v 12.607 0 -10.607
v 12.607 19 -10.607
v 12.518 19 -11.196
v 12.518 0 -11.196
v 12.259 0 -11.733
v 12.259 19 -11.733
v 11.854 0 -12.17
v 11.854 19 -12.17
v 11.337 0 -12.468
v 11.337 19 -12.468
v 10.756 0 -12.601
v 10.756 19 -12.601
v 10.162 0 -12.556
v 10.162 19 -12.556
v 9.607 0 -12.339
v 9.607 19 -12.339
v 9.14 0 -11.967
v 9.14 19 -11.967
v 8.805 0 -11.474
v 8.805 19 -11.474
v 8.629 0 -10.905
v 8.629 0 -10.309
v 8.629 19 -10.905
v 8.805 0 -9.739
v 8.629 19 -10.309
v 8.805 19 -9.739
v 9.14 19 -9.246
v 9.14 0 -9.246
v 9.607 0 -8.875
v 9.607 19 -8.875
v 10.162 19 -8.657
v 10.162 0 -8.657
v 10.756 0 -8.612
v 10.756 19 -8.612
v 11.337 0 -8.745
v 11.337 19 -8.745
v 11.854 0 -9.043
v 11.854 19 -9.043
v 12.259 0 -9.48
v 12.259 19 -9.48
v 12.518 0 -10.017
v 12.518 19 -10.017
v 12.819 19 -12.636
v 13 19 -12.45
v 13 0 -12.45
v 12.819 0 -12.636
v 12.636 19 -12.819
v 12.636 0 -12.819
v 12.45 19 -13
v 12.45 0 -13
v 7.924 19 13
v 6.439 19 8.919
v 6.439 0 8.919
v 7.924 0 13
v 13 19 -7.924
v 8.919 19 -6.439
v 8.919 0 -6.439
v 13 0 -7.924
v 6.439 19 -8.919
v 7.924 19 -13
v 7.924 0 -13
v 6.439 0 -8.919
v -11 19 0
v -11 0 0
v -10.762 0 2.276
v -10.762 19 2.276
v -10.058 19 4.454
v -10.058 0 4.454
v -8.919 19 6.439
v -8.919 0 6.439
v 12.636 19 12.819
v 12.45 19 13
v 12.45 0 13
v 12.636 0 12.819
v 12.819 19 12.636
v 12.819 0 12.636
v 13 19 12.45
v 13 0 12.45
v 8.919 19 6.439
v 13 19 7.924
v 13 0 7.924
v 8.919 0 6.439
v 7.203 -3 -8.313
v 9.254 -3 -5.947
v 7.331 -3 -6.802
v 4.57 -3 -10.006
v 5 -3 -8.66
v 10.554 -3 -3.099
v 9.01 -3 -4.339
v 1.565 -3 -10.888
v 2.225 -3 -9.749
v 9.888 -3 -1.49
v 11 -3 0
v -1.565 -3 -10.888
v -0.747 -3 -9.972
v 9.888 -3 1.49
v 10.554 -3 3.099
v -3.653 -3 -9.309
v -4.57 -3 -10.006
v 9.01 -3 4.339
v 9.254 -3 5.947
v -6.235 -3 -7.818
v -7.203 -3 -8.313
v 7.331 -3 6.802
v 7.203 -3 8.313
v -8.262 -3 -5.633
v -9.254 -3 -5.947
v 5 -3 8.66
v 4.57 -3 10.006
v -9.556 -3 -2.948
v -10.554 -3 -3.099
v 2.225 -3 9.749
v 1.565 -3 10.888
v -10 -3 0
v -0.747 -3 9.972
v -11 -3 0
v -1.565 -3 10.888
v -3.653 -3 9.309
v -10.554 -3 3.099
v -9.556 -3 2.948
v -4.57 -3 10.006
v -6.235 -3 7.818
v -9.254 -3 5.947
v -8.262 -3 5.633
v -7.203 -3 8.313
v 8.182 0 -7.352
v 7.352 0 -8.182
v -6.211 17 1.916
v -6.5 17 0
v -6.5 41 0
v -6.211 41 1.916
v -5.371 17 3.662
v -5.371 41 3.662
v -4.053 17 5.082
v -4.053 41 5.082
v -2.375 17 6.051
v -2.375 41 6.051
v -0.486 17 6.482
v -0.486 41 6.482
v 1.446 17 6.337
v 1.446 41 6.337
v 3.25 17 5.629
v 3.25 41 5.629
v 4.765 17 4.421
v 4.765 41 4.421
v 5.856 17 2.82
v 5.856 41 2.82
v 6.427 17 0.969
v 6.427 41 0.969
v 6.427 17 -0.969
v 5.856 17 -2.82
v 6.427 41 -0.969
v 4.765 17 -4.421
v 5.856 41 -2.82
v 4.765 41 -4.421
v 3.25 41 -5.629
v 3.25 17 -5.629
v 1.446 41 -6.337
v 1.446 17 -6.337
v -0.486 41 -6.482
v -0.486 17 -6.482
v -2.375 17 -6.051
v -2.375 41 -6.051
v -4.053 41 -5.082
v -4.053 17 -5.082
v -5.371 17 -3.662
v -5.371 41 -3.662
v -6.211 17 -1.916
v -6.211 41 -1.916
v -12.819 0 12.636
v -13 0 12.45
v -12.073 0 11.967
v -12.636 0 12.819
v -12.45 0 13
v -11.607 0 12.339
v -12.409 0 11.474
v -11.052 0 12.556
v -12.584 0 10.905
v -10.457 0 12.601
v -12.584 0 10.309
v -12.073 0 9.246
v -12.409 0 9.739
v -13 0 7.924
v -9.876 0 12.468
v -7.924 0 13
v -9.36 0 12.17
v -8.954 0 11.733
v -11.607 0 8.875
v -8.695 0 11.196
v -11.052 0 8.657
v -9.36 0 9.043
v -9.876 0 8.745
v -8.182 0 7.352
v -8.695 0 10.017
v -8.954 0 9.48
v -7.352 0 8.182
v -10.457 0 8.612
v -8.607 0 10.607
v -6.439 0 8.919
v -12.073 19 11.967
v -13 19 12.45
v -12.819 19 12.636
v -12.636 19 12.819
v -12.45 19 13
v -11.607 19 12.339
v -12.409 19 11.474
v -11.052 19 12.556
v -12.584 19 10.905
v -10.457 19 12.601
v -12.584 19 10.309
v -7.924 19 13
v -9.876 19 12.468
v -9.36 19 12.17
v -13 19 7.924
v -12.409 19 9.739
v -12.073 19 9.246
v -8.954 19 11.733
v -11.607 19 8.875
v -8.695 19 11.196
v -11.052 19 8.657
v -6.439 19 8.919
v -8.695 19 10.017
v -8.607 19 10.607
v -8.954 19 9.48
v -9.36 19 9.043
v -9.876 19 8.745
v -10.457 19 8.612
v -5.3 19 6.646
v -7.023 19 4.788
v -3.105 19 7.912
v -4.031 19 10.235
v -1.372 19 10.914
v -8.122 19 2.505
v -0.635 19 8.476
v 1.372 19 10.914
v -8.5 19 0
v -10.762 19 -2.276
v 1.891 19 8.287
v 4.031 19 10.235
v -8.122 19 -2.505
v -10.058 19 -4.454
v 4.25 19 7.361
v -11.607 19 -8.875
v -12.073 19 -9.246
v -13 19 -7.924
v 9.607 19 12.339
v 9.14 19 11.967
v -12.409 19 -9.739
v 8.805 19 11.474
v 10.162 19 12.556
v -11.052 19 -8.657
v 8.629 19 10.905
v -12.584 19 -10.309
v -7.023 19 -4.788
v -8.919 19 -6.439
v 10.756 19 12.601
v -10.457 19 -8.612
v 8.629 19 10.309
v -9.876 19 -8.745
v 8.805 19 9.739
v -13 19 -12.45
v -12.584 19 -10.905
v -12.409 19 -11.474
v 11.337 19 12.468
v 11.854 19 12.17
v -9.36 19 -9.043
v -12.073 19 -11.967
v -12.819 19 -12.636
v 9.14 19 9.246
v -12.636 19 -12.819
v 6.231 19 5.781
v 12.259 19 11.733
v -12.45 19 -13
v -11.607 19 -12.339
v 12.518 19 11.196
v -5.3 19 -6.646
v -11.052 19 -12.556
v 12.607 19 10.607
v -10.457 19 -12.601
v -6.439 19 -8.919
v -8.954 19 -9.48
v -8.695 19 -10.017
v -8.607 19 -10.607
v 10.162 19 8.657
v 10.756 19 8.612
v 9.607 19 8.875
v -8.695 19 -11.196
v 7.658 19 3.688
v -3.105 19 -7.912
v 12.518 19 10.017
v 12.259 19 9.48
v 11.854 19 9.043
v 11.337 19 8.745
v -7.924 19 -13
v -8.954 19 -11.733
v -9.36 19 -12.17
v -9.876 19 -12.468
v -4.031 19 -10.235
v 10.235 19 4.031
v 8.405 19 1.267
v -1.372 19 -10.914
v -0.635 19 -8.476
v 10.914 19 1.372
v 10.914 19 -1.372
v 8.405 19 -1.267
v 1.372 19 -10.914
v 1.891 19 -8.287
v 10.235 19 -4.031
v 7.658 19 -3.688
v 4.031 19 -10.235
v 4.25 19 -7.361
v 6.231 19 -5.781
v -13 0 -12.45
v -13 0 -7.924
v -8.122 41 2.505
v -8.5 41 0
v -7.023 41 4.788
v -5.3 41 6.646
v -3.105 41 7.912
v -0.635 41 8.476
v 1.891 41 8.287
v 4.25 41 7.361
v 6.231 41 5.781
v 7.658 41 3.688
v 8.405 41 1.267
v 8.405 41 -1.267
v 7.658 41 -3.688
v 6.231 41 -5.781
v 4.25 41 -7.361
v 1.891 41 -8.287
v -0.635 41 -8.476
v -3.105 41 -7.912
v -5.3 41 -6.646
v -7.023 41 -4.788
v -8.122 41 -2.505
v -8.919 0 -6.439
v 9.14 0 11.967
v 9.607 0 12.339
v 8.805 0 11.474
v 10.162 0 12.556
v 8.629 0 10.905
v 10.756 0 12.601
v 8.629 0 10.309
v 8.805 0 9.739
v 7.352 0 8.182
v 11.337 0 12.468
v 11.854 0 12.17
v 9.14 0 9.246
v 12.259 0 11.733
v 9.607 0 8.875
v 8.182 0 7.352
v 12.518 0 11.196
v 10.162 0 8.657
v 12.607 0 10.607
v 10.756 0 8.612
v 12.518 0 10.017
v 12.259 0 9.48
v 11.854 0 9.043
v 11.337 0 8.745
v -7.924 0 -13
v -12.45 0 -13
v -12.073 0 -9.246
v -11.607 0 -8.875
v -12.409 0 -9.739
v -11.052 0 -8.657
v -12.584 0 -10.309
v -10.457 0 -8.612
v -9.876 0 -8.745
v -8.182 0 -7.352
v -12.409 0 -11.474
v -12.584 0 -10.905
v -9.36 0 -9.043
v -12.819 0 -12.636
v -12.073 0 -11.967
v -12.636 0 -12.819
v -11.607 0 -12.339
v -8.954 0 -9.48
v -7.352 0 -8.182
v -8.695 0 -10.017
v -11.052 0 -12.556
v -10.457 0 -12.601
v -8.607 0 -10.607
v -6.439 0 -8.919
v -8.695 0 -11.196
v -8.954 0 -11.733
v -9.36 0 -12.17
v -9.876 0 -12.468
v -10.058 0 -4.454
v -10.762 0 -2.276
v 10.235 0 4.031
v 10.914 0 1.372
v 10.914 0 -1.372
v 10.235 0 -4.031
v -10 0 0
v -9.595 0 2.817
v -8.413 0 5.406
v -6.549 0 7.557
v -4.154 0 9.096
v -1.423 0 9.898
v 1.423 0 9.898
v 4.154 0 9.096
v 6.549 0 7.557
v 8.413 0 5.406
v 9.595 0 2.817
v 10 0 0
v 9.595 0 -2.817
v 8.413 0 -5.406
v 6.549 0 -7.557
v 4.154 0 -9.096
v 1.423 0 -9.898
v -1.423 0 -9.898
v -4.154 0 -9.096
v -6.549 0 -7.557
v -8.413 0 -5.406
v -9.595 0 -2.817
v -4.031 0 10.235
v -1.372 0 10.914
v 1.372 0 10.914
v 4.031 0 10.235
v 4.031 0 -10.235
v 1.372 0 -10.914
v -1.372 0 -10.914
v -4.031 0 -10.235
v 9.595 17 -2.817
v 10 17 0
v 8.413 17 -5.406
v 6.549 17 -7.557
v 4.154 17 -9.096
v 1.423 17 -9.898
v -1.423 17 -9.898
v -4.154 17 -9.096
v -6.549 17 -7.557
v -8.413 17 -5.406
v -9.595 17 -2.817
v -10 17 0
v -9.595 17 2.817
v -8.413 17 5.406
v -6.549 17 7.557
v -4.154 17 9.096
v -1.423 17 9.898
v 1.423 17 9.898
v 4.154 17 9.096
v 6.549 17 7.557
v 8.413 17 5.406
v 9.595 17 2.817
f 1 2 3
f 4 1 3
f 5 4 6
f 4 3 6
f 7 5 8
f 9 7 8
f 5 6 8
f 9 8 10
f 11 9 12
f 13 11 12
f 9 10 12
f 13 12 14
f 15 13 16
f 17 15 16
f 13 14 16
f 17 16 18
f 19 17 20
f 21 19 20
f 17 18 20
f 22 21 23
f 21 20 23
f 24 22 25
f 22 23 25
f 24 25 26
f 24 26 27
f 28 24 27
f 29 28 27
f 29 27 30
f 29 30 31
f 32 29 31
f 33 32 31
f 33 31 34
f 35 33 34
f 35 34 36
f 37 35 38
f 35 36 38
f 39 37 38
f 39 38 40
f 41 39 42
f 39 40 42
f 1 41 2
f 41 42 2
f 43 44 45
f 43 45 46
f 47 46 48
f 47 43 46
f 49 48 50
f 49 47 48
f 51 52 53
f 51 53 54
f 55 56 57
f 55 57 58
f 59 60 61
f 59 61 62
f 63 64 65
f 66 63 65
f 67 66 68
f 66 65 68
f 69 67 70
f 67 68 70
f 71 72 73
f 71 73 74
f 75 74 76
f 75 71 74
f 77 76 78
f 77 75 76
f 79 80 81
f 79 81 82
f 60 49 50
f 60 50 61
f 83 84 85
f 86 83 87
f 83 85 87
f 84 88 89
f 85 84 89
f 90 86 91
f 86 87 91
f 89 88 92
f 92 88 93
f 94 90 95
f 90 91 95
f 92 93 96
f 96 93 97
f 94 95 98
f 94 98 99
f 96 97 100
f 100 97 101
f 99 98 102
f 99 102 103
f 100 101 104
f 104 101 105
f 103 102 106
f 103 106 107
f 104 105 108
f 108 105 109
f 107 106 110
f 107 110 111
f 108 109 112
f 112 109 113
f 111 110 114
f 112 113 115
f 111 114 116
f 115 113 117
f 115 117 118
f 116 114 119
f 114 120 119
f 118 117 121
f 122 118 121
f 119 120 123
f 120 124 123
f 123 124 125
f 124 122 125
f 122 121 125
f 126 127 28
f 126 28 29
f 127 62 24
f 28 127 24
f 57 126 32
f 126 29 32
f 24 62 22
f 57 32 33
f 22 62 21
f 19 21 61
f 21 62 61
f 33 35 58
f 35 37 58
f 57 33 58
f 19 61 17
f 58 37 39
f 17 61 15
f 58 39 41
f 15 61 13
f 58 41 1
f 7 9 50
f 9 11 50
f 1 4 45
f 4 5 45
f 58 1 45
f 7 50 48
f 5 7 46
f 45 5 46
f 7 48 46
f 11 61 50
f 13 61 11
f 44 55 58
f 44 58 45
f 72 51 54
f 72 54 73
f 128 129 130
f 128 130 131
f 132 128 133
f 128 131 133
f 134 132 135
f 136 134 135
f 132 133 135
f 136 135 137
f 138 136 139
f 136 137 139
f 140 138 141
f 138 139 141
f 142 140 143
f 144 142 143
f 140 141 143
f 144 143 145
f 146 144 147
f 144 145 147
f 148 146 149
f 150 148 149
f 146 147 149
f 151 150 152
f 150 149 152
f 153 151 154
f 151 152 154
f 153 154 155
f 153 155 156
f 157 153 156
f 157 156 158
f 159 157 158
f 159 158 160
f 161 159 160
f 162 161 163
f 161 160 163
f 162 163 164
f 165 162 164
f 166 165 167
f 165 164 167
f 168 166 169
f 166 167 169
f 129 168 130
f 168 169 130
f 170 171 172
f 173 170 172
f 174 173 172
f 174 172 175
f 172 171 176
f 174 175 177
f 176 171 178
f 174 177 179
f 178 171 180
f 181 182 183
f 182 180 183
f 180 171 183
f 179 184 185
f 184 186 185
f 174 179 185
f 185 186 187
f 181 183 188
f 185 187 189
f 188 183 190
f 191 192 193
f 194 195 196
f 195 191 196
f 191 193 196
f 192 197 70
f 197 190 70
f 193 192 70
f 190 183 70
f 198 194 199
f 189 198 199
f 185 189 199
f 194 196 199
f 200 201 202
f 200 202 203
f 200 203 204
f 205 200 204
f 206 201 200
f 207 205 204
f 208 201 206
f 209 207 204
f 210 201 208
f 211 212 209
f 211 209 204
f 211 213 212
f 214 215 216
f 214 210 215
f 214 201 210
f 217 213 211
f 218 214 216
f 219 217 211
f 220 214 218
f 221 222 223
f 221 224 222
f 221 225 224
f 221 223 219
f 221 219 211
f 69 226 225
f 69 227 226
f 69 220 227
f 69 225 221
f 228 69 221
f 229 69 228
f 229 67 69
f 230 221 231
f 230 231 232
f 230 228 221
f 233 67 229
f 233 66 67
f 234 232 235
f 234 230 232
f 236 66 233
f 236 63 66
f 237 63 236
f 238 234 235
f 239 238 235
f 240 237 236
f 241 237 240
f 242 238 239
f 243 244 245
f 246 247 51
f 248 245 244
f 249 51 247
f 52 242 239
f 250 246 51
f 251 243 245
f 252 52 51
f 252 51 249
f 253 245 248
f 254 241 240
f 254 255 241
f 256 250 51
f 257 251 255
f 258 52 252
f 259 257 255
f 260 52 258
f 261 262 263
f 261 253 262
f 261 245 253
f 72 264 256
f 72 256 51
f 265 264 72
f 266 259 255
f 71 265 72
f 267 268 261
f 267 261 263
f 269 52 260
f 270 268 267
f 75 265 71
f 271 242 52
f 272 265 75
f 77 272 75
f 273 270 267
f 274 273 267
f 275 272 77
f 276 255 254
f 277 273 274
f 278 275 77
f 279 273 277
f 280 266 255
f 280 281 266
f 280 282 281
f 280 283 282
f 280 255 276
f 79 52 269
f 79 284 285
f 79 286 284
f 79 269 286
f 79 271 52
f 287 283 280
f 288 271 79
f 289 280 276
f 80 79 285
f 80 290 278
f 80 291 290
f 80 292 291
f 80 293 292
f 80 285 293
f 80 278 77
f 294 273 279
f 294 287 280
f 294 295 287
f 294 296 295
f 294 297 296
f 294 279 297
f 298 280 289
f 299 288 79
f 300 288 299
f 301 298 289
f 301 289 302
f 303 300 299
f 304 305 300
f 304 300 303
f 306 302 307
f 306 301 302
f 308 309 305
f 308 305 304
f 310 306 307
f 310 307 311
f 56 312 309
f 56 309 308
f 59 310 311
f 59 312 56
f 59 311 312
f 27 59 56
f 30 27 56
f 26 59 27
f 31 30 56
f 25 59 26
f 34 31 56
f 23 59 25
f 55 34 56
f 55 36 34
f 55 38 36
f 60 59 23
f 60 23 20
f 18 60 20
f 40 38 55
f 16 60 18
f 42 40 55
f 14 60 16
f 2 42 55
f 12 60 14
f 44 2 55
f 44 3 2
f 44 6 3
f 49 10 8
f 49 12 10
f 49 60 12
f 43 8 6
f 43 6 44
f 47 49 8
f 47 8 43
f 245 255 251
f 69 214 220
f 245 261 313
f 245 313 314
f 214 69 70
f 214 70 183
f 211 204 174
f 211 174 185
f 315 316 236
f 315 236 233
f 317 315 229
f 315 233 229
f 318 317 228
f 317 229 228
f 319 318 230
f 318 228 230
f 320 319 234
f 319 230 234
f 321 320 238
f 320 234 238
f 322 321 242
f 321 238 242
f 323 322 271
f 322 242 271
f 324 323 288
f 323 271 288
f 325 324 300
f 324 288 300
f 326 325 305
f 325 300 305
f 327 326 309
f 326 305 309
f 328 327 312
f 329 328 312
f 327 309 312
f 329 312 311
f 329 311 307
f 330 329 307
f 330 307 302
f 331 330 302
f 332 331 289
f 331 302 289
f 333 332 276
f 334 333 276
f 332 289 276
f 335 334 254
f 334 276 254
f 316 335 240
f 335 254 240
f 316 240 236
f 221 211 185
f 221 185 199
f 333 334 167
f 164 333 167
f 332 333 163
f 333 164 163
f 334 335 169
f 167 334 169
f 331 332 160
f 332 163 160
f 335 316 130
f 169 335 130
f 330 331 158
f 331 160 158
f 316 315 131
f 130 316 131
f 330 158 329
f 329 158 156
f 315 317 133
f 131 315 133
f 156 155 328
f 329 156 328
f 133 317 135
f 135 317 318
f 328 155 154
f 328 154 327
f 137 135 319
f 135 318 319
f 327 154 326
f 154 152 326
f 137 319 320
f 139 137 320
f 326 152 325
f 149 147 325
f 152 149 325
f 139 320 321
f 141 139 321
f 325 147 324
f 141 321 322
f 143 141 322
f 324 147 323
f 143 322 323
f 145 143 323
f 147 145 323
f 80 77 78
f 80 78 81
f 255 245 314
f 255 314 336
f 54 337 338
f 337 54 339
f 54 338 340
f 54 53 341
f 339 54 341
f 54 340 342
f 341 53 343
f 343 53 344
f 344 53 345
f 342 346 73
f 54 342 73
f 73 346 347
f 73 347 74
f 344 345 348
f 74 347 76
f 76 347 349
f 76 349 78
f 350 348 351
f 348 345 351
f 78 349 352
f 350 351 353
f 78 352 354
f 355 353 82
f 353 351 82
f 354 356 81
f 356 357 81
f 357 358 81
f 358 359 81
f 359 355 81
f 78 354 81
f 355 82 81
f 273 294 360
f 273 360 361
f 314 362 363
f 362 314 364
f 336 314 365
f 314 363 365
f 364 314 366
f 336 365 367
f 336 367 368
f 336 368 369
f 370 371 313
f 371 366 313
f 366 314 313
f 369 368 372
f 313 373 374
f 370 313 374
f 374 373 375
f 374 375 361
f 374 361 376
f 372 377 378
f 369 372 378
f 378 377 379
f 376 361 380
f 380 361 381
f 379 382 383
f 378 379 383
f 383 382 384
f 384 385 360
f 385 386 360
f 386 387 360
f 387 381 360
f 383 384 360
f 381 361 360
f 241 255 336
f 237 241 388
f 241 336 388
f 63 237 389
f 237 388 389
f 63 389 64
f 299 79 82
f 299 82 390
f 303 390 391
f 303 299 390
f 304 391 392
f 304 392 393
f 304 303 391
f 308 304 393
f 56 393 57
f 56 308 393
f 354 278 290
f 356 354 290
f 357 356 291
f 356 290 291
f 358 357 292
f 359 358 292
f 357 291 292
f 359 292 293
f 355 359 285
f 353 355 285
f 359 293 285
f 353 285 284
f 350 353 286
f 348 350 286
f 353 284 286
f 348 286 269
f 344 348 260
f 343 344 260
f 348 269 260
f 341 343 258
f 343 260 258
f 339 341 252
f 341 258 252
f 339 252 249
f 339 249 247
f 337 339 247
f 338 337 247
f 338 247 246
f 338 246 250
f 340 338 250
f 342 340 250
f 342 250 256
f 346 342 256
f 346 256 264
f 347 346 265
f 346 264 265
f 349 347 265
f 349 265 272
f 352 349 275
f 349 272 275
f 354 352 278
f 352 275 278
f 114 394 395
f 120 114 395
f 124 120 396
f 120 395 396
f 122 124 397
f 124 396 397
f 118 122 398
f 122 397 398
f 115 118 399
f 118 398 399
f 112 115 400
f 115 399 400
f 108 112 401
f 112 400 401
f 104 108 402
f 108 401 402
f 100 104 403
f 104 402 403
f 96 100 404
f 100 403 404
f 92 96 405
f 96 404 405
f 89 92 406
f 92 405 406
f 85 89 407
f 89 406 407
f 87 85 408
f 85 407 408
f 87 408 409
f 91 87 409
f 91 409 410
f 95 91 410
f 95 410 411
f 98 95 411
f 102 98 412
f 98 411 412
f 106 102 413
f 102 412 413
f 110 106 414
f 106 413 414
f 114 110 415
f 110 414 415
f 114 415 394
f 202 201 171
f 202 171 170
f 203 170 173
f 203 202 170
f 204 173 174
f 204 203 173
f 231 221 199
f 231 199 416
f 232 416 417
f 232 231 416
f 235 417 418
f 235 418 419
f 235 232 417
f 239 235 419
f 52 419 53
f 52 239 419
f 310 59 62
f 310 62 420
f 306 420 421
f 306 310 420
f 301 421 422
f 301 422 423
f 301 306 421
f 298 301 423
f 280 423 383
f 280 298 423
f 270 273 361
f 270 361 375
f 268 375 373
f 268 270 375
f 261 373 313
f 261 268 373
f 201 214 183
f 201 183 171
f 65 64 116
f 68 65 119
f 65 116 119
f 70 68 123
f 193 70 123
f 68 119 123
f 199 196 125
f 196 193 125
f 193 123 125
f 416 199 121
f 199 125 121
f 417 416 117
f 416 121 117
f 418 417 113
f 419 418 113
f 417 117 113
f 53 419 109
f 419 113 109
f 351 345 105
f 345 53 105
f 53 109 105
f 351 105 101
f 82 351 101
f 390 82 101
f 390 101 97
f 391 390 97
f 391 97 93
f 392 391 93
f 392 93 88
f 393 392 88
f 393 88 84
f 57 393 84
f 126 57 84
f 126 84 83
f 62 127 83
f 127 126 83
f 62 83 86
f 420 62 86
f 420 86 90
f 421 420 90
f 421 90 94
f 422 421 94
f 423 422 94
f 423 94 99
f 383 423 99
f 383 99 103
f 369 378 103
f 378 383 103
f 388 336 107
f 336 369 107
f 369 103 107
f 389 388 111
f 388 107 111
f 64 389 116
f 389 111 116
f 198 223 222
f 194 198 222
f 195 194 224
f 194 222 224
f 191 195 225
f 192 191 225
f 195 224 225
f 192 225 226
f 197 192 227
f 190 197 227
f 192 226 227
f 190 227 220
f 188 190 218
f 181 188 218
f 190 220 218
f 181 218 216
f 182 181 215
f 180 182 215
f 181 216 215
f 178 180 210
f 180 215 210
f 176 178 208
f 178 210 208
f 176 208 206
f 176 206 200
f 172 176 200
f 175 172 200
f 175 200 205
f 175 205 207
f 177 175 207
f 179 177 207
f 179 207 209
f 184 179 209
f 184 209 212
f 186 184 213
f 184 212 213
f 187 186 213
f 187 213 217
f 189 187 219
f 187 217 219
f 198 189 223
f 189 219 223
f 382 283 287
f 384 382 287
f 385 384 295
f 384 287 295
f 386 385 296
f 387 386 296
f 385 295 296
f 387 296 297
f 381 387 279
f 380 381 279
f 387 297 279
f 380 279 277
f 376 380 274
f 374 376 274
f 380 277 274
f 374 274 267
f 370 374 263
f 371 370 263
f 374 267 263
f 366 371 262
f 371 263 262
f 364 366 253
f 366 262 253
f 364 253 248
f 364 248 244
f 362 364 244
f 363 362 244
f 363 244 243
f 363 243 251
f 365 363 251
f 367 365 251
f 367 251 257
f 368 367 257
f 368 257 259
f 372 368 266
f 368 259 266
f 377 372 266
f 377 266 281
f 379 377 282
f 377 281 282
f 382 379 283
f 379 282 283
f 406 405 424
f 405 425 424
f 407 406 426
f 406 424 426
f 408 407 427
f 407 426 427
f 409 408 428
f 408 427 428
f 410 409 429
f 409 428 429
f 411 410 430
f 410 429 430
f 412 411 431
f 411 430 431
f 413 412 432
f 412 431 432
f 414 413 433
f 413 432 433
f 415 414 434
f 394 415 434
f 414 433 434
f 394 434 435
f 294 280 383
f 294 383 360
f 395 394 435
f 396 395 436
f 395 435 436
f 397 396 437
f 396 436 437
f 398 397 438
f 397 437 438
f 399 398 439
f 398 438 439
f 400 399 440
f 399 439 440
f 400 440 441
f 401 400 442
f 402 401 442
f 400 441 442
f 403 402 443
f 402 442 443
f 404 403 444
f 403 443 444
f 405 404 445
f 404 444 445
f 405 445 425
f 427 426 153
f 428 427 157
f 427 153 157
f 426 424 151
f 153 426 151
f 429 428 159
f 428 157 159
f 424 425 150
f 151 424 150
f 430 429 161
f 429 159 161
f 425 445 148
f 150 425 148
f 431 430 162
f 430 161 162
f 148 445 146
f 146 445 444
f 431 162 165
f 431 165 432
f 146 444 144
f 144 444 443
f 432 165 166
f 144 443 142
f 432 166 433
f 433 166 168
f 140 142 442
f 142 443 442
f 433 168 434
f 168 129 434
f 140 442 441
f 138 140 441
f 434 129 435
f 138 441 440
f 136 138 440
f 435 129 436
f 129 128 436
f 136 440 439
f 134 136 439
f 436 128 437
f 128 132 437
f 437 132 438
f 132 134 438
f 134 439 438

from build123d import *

# Parameters (mm, degrees)
ESQUISSE3_R      = 2
ESQUISSE3_R_2    = 10
EXTRUSION2_DEPTH = 19


with BuildPart() as part:
    # Esquisse1 → Révolution1 (revolve)
    with BuildSketch(Plane.XY):
        Polygon((-6.5, 17), (-6.5, 41), (-8.5, 41), (-8.5, 19), (-11, 19), (-11, -3), (-10, -3), (-10, 17), align=None)
    revolve(axis=Axis((0, 0, 0), (0, 1, 0)))

    # Esquisse3 → Extrusion2 (add)
    with BuildSketch(Plane(origin=(0, 19, 0), x_dir=(1, 0, 0), z_dir=(0, 1, 0))):
        with BuildLine():
            Line((-12.449899598, -13), (-7.924146363, -13))
            Line((-7.924146363, -13), (-6.438678833, -8.918711504))
            ThreePointArc((-6.438678833, -8.918711504), (0, -11), (6.438678833, -8.918711504))
            Line((6.438678833, -8.918711504), (7.924146363, -13))
            Line((7.924146363, -13), (12.449899598, -13))
            ThreePointArc((12.449899598, -13), (12.727922061, -12.727922061), (13, -12.449899598))
            Line((13, -12.449899598), (13, -7.924146363))
            Line((13, -7.924146363), (8.918711504, -6.438678833))
            ThreePointArc((8.918711504, -6.438678833), (11, 0), (8.918711504, 6.438678833))
            Line((8.918711504, 6.438678833), (13, 7.924146363))
            Line((13, 7.924146363), (13, 12.449899598))
            ThreePointArc((13, 12.449899598), (12.727922061, 12.727922061), (12.449899598, 13))
            Line((12.449899598, 13), (7.924146363, 13))
            Line((7.924146363, 13), (6.438678833, 8.918711504))
            ThreePointArc((6.438678833, 8.918711504), (0, 11), (-6.438678833, 8.918711504))
            Line((-6.438678833, 8.918711504), (-7.924146363, 13))
            Line((-7.924146363, 13), (-12.449899598, 13))
            ThreePointArc((-12.449899598, 13), (-12.727922061, 12.727922061), (-13, 12.449899598))
            Line((-13, 12.449899598), (-13, 7.924146363))
            Line((-13, 7.924146363), (-8.918711504, 6.438678833))
            ThreePointArc((-8.918711504, 6.438678833), (-11, 0), (-8.918711504, -6.438678833))
            Line((-8.918711504, -6.438678833), (-13, -7.924146363))
            Line((-13, -7.924146363), (-13, -12.449899598))
            ThreePointArc((-13, -12.449899598), (-12.727922061, -12.727922061), (-12.449899598, -13))
        make_face()
        with Locations((10.606601718, 10.606601718)):
            Circle(ESQUISSE3_R, mode=Mode.SUBTRACT)
        with Locations((-10.606601718, -10.606601718)):
            Circle(ESQUISSE3_R, mode=Mode.SUBTRACT)
        with Locations((-10.606601718, 10.606601718)):
            Circle(ESQUISSE3_R, mode=Mode.SUBTRACT)
        with Locations((10.606601718, -10.606601718)):
            Circle(ESQUISSE3_R, mode=Mode.SUBTRACT)
        Circle(ESQUISSE3_R_2, mode=Mode.SUBTRACT)
    extrude(amount=-EXTRUSION2_DEPTH)


solid = part.part
